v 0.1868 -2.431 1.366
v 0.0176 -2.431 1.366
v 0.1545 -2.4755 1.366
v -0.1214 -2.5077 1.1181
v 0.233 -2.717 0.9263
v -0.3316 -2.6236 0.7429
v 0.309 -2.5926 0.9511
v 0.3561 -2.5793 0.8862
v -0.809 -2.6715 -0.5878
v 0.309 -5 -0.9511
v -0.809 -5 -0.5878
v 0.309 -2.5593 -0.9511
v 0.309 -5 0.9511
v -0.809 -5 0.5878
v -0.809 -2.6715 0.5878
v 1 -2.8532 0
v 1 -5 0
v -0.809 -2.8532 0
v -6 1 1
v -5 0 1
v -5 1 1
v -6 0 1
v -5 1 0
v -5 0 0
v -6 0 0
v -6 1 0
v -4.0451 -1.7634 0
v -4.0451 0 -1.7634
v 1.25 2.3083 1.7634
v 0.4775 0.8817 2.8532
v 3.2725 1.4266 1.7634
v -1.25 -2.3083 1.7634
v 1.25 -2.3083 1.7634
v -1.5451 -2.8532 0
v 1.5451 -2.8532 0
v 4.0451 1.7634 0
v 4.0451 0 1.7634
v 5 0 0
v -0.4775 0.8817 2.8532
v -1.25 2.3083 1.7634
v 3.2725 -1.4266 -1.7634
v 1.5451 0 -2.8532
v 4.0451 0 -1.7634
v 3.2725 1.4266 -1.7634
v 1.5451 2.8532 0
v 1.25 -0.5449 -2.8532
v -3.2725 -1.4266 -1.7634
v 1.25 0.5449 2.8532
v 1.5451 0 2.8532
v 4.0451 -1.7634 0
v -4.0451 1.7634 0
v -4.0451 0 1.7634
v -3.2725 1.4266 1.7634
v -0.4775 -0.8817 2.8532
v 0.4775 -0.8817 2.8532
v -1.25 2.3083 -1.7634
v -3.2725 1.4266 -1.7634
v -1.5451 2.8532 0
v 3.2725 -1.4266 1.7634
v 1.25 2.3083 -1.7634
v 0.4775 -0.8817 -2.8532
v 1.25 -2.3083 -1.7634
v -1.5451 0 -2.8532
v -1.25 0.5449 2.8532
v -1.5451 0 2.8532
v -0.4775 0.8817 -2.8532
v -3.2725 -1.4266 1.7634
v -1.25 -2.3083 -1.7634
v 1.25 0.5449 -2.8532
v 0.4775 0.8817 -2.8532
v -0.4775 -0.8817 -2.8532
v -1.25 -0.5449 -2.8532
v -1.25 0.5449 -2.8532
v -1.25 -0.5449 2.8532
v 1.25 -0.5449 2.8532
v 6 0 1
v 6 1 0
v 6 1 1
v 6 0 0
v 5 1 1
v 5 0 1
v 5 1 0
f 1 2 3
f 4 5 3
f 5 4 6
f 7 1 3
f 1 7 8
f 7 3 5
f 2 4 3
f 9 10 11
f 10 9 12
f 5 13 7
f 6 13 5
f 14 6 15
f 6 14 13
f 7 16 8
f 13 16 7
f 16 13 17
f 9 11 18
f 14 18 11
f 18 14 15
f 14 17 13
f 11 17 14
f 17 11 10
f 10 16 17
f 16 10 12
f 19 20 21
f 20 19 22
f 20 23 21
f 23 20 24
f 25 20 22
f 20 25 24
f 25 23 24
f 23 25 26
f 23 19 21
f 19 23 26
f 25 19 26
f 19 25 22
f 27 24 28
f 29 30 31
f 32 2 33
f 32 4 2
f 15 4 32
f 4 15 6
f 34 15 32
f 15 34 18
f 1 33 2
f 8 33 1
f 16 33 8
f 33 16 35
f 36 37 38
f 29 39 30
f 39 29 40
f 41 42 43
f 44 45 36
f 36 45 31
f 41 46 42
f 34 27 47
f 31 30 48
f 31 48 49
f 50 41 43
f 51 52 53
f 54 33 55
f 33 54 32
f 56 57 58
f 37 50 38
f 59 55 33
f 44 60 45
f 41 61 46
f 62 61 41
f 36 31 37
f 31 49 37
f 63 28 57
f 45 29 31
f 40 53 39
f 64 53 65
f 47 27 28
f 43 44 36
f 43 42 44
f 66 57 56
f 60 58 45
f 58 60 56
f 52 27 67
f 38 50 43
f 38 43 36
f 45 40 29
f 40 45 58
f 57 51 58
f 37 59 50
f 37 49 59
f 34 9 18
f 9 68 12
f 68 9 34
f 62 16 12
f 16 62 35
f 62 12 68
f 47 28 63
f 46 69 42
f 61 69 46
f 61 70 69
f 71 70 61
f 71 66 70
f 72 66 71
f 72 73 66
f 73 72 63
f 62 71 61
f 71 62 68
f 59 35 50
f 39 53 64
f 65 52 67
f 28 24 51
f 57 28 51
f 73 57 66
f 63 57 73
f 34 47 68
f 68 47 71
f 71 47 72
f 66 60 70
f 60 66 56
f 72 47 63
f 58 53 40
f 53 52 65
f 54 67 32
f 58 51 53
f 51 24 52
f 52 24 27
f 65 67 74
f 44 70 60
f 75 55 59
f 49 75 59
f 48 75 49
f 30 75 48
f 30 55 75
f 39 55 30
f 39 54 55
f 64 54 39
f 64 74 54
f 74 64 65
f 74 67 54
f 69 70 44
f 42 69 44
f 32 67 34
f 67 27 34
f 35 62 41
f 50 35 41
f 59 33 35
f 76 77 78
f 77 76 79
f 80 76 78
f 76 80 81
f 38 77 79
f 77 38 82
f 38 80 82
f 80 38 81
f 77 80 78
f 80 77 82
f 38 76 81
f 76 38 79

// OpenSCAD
// Transform chains in the forms OpenSCAD users actually write.
translate([1, 0, 0]) cube(1);
translate([0, -2, 0.5]) sphere(1);

rotate(45) square(2);
rotate([90, 0, 0]) cylinder(h = 5, r = 1);
rotate(a = 30, v = [1, 1, 0]) cube(2);

scale(2) sphere(1);
scale([1, 2, 0.5]) cube(1);

mirror([1, 0, 0]) translate([5, 0, 0]) cube(1);

color("red") cube(1);
color("steelblue", 0.5) sphere(1);
color("#ff8800") cylinder(h = 2, r = 1);
color([0.2, 0.4, 0.8]) cube(1);
color([0.2, 0.4, 0.8, 0.5]) cube(1);

resize([10, 0, 0]) sphere(3);
multmatrix([[1, 0, 0, 5], [0, 1, 0, 0], [0, 0, 1, 0], [0, 0, 0, 1]]) cube(1);
